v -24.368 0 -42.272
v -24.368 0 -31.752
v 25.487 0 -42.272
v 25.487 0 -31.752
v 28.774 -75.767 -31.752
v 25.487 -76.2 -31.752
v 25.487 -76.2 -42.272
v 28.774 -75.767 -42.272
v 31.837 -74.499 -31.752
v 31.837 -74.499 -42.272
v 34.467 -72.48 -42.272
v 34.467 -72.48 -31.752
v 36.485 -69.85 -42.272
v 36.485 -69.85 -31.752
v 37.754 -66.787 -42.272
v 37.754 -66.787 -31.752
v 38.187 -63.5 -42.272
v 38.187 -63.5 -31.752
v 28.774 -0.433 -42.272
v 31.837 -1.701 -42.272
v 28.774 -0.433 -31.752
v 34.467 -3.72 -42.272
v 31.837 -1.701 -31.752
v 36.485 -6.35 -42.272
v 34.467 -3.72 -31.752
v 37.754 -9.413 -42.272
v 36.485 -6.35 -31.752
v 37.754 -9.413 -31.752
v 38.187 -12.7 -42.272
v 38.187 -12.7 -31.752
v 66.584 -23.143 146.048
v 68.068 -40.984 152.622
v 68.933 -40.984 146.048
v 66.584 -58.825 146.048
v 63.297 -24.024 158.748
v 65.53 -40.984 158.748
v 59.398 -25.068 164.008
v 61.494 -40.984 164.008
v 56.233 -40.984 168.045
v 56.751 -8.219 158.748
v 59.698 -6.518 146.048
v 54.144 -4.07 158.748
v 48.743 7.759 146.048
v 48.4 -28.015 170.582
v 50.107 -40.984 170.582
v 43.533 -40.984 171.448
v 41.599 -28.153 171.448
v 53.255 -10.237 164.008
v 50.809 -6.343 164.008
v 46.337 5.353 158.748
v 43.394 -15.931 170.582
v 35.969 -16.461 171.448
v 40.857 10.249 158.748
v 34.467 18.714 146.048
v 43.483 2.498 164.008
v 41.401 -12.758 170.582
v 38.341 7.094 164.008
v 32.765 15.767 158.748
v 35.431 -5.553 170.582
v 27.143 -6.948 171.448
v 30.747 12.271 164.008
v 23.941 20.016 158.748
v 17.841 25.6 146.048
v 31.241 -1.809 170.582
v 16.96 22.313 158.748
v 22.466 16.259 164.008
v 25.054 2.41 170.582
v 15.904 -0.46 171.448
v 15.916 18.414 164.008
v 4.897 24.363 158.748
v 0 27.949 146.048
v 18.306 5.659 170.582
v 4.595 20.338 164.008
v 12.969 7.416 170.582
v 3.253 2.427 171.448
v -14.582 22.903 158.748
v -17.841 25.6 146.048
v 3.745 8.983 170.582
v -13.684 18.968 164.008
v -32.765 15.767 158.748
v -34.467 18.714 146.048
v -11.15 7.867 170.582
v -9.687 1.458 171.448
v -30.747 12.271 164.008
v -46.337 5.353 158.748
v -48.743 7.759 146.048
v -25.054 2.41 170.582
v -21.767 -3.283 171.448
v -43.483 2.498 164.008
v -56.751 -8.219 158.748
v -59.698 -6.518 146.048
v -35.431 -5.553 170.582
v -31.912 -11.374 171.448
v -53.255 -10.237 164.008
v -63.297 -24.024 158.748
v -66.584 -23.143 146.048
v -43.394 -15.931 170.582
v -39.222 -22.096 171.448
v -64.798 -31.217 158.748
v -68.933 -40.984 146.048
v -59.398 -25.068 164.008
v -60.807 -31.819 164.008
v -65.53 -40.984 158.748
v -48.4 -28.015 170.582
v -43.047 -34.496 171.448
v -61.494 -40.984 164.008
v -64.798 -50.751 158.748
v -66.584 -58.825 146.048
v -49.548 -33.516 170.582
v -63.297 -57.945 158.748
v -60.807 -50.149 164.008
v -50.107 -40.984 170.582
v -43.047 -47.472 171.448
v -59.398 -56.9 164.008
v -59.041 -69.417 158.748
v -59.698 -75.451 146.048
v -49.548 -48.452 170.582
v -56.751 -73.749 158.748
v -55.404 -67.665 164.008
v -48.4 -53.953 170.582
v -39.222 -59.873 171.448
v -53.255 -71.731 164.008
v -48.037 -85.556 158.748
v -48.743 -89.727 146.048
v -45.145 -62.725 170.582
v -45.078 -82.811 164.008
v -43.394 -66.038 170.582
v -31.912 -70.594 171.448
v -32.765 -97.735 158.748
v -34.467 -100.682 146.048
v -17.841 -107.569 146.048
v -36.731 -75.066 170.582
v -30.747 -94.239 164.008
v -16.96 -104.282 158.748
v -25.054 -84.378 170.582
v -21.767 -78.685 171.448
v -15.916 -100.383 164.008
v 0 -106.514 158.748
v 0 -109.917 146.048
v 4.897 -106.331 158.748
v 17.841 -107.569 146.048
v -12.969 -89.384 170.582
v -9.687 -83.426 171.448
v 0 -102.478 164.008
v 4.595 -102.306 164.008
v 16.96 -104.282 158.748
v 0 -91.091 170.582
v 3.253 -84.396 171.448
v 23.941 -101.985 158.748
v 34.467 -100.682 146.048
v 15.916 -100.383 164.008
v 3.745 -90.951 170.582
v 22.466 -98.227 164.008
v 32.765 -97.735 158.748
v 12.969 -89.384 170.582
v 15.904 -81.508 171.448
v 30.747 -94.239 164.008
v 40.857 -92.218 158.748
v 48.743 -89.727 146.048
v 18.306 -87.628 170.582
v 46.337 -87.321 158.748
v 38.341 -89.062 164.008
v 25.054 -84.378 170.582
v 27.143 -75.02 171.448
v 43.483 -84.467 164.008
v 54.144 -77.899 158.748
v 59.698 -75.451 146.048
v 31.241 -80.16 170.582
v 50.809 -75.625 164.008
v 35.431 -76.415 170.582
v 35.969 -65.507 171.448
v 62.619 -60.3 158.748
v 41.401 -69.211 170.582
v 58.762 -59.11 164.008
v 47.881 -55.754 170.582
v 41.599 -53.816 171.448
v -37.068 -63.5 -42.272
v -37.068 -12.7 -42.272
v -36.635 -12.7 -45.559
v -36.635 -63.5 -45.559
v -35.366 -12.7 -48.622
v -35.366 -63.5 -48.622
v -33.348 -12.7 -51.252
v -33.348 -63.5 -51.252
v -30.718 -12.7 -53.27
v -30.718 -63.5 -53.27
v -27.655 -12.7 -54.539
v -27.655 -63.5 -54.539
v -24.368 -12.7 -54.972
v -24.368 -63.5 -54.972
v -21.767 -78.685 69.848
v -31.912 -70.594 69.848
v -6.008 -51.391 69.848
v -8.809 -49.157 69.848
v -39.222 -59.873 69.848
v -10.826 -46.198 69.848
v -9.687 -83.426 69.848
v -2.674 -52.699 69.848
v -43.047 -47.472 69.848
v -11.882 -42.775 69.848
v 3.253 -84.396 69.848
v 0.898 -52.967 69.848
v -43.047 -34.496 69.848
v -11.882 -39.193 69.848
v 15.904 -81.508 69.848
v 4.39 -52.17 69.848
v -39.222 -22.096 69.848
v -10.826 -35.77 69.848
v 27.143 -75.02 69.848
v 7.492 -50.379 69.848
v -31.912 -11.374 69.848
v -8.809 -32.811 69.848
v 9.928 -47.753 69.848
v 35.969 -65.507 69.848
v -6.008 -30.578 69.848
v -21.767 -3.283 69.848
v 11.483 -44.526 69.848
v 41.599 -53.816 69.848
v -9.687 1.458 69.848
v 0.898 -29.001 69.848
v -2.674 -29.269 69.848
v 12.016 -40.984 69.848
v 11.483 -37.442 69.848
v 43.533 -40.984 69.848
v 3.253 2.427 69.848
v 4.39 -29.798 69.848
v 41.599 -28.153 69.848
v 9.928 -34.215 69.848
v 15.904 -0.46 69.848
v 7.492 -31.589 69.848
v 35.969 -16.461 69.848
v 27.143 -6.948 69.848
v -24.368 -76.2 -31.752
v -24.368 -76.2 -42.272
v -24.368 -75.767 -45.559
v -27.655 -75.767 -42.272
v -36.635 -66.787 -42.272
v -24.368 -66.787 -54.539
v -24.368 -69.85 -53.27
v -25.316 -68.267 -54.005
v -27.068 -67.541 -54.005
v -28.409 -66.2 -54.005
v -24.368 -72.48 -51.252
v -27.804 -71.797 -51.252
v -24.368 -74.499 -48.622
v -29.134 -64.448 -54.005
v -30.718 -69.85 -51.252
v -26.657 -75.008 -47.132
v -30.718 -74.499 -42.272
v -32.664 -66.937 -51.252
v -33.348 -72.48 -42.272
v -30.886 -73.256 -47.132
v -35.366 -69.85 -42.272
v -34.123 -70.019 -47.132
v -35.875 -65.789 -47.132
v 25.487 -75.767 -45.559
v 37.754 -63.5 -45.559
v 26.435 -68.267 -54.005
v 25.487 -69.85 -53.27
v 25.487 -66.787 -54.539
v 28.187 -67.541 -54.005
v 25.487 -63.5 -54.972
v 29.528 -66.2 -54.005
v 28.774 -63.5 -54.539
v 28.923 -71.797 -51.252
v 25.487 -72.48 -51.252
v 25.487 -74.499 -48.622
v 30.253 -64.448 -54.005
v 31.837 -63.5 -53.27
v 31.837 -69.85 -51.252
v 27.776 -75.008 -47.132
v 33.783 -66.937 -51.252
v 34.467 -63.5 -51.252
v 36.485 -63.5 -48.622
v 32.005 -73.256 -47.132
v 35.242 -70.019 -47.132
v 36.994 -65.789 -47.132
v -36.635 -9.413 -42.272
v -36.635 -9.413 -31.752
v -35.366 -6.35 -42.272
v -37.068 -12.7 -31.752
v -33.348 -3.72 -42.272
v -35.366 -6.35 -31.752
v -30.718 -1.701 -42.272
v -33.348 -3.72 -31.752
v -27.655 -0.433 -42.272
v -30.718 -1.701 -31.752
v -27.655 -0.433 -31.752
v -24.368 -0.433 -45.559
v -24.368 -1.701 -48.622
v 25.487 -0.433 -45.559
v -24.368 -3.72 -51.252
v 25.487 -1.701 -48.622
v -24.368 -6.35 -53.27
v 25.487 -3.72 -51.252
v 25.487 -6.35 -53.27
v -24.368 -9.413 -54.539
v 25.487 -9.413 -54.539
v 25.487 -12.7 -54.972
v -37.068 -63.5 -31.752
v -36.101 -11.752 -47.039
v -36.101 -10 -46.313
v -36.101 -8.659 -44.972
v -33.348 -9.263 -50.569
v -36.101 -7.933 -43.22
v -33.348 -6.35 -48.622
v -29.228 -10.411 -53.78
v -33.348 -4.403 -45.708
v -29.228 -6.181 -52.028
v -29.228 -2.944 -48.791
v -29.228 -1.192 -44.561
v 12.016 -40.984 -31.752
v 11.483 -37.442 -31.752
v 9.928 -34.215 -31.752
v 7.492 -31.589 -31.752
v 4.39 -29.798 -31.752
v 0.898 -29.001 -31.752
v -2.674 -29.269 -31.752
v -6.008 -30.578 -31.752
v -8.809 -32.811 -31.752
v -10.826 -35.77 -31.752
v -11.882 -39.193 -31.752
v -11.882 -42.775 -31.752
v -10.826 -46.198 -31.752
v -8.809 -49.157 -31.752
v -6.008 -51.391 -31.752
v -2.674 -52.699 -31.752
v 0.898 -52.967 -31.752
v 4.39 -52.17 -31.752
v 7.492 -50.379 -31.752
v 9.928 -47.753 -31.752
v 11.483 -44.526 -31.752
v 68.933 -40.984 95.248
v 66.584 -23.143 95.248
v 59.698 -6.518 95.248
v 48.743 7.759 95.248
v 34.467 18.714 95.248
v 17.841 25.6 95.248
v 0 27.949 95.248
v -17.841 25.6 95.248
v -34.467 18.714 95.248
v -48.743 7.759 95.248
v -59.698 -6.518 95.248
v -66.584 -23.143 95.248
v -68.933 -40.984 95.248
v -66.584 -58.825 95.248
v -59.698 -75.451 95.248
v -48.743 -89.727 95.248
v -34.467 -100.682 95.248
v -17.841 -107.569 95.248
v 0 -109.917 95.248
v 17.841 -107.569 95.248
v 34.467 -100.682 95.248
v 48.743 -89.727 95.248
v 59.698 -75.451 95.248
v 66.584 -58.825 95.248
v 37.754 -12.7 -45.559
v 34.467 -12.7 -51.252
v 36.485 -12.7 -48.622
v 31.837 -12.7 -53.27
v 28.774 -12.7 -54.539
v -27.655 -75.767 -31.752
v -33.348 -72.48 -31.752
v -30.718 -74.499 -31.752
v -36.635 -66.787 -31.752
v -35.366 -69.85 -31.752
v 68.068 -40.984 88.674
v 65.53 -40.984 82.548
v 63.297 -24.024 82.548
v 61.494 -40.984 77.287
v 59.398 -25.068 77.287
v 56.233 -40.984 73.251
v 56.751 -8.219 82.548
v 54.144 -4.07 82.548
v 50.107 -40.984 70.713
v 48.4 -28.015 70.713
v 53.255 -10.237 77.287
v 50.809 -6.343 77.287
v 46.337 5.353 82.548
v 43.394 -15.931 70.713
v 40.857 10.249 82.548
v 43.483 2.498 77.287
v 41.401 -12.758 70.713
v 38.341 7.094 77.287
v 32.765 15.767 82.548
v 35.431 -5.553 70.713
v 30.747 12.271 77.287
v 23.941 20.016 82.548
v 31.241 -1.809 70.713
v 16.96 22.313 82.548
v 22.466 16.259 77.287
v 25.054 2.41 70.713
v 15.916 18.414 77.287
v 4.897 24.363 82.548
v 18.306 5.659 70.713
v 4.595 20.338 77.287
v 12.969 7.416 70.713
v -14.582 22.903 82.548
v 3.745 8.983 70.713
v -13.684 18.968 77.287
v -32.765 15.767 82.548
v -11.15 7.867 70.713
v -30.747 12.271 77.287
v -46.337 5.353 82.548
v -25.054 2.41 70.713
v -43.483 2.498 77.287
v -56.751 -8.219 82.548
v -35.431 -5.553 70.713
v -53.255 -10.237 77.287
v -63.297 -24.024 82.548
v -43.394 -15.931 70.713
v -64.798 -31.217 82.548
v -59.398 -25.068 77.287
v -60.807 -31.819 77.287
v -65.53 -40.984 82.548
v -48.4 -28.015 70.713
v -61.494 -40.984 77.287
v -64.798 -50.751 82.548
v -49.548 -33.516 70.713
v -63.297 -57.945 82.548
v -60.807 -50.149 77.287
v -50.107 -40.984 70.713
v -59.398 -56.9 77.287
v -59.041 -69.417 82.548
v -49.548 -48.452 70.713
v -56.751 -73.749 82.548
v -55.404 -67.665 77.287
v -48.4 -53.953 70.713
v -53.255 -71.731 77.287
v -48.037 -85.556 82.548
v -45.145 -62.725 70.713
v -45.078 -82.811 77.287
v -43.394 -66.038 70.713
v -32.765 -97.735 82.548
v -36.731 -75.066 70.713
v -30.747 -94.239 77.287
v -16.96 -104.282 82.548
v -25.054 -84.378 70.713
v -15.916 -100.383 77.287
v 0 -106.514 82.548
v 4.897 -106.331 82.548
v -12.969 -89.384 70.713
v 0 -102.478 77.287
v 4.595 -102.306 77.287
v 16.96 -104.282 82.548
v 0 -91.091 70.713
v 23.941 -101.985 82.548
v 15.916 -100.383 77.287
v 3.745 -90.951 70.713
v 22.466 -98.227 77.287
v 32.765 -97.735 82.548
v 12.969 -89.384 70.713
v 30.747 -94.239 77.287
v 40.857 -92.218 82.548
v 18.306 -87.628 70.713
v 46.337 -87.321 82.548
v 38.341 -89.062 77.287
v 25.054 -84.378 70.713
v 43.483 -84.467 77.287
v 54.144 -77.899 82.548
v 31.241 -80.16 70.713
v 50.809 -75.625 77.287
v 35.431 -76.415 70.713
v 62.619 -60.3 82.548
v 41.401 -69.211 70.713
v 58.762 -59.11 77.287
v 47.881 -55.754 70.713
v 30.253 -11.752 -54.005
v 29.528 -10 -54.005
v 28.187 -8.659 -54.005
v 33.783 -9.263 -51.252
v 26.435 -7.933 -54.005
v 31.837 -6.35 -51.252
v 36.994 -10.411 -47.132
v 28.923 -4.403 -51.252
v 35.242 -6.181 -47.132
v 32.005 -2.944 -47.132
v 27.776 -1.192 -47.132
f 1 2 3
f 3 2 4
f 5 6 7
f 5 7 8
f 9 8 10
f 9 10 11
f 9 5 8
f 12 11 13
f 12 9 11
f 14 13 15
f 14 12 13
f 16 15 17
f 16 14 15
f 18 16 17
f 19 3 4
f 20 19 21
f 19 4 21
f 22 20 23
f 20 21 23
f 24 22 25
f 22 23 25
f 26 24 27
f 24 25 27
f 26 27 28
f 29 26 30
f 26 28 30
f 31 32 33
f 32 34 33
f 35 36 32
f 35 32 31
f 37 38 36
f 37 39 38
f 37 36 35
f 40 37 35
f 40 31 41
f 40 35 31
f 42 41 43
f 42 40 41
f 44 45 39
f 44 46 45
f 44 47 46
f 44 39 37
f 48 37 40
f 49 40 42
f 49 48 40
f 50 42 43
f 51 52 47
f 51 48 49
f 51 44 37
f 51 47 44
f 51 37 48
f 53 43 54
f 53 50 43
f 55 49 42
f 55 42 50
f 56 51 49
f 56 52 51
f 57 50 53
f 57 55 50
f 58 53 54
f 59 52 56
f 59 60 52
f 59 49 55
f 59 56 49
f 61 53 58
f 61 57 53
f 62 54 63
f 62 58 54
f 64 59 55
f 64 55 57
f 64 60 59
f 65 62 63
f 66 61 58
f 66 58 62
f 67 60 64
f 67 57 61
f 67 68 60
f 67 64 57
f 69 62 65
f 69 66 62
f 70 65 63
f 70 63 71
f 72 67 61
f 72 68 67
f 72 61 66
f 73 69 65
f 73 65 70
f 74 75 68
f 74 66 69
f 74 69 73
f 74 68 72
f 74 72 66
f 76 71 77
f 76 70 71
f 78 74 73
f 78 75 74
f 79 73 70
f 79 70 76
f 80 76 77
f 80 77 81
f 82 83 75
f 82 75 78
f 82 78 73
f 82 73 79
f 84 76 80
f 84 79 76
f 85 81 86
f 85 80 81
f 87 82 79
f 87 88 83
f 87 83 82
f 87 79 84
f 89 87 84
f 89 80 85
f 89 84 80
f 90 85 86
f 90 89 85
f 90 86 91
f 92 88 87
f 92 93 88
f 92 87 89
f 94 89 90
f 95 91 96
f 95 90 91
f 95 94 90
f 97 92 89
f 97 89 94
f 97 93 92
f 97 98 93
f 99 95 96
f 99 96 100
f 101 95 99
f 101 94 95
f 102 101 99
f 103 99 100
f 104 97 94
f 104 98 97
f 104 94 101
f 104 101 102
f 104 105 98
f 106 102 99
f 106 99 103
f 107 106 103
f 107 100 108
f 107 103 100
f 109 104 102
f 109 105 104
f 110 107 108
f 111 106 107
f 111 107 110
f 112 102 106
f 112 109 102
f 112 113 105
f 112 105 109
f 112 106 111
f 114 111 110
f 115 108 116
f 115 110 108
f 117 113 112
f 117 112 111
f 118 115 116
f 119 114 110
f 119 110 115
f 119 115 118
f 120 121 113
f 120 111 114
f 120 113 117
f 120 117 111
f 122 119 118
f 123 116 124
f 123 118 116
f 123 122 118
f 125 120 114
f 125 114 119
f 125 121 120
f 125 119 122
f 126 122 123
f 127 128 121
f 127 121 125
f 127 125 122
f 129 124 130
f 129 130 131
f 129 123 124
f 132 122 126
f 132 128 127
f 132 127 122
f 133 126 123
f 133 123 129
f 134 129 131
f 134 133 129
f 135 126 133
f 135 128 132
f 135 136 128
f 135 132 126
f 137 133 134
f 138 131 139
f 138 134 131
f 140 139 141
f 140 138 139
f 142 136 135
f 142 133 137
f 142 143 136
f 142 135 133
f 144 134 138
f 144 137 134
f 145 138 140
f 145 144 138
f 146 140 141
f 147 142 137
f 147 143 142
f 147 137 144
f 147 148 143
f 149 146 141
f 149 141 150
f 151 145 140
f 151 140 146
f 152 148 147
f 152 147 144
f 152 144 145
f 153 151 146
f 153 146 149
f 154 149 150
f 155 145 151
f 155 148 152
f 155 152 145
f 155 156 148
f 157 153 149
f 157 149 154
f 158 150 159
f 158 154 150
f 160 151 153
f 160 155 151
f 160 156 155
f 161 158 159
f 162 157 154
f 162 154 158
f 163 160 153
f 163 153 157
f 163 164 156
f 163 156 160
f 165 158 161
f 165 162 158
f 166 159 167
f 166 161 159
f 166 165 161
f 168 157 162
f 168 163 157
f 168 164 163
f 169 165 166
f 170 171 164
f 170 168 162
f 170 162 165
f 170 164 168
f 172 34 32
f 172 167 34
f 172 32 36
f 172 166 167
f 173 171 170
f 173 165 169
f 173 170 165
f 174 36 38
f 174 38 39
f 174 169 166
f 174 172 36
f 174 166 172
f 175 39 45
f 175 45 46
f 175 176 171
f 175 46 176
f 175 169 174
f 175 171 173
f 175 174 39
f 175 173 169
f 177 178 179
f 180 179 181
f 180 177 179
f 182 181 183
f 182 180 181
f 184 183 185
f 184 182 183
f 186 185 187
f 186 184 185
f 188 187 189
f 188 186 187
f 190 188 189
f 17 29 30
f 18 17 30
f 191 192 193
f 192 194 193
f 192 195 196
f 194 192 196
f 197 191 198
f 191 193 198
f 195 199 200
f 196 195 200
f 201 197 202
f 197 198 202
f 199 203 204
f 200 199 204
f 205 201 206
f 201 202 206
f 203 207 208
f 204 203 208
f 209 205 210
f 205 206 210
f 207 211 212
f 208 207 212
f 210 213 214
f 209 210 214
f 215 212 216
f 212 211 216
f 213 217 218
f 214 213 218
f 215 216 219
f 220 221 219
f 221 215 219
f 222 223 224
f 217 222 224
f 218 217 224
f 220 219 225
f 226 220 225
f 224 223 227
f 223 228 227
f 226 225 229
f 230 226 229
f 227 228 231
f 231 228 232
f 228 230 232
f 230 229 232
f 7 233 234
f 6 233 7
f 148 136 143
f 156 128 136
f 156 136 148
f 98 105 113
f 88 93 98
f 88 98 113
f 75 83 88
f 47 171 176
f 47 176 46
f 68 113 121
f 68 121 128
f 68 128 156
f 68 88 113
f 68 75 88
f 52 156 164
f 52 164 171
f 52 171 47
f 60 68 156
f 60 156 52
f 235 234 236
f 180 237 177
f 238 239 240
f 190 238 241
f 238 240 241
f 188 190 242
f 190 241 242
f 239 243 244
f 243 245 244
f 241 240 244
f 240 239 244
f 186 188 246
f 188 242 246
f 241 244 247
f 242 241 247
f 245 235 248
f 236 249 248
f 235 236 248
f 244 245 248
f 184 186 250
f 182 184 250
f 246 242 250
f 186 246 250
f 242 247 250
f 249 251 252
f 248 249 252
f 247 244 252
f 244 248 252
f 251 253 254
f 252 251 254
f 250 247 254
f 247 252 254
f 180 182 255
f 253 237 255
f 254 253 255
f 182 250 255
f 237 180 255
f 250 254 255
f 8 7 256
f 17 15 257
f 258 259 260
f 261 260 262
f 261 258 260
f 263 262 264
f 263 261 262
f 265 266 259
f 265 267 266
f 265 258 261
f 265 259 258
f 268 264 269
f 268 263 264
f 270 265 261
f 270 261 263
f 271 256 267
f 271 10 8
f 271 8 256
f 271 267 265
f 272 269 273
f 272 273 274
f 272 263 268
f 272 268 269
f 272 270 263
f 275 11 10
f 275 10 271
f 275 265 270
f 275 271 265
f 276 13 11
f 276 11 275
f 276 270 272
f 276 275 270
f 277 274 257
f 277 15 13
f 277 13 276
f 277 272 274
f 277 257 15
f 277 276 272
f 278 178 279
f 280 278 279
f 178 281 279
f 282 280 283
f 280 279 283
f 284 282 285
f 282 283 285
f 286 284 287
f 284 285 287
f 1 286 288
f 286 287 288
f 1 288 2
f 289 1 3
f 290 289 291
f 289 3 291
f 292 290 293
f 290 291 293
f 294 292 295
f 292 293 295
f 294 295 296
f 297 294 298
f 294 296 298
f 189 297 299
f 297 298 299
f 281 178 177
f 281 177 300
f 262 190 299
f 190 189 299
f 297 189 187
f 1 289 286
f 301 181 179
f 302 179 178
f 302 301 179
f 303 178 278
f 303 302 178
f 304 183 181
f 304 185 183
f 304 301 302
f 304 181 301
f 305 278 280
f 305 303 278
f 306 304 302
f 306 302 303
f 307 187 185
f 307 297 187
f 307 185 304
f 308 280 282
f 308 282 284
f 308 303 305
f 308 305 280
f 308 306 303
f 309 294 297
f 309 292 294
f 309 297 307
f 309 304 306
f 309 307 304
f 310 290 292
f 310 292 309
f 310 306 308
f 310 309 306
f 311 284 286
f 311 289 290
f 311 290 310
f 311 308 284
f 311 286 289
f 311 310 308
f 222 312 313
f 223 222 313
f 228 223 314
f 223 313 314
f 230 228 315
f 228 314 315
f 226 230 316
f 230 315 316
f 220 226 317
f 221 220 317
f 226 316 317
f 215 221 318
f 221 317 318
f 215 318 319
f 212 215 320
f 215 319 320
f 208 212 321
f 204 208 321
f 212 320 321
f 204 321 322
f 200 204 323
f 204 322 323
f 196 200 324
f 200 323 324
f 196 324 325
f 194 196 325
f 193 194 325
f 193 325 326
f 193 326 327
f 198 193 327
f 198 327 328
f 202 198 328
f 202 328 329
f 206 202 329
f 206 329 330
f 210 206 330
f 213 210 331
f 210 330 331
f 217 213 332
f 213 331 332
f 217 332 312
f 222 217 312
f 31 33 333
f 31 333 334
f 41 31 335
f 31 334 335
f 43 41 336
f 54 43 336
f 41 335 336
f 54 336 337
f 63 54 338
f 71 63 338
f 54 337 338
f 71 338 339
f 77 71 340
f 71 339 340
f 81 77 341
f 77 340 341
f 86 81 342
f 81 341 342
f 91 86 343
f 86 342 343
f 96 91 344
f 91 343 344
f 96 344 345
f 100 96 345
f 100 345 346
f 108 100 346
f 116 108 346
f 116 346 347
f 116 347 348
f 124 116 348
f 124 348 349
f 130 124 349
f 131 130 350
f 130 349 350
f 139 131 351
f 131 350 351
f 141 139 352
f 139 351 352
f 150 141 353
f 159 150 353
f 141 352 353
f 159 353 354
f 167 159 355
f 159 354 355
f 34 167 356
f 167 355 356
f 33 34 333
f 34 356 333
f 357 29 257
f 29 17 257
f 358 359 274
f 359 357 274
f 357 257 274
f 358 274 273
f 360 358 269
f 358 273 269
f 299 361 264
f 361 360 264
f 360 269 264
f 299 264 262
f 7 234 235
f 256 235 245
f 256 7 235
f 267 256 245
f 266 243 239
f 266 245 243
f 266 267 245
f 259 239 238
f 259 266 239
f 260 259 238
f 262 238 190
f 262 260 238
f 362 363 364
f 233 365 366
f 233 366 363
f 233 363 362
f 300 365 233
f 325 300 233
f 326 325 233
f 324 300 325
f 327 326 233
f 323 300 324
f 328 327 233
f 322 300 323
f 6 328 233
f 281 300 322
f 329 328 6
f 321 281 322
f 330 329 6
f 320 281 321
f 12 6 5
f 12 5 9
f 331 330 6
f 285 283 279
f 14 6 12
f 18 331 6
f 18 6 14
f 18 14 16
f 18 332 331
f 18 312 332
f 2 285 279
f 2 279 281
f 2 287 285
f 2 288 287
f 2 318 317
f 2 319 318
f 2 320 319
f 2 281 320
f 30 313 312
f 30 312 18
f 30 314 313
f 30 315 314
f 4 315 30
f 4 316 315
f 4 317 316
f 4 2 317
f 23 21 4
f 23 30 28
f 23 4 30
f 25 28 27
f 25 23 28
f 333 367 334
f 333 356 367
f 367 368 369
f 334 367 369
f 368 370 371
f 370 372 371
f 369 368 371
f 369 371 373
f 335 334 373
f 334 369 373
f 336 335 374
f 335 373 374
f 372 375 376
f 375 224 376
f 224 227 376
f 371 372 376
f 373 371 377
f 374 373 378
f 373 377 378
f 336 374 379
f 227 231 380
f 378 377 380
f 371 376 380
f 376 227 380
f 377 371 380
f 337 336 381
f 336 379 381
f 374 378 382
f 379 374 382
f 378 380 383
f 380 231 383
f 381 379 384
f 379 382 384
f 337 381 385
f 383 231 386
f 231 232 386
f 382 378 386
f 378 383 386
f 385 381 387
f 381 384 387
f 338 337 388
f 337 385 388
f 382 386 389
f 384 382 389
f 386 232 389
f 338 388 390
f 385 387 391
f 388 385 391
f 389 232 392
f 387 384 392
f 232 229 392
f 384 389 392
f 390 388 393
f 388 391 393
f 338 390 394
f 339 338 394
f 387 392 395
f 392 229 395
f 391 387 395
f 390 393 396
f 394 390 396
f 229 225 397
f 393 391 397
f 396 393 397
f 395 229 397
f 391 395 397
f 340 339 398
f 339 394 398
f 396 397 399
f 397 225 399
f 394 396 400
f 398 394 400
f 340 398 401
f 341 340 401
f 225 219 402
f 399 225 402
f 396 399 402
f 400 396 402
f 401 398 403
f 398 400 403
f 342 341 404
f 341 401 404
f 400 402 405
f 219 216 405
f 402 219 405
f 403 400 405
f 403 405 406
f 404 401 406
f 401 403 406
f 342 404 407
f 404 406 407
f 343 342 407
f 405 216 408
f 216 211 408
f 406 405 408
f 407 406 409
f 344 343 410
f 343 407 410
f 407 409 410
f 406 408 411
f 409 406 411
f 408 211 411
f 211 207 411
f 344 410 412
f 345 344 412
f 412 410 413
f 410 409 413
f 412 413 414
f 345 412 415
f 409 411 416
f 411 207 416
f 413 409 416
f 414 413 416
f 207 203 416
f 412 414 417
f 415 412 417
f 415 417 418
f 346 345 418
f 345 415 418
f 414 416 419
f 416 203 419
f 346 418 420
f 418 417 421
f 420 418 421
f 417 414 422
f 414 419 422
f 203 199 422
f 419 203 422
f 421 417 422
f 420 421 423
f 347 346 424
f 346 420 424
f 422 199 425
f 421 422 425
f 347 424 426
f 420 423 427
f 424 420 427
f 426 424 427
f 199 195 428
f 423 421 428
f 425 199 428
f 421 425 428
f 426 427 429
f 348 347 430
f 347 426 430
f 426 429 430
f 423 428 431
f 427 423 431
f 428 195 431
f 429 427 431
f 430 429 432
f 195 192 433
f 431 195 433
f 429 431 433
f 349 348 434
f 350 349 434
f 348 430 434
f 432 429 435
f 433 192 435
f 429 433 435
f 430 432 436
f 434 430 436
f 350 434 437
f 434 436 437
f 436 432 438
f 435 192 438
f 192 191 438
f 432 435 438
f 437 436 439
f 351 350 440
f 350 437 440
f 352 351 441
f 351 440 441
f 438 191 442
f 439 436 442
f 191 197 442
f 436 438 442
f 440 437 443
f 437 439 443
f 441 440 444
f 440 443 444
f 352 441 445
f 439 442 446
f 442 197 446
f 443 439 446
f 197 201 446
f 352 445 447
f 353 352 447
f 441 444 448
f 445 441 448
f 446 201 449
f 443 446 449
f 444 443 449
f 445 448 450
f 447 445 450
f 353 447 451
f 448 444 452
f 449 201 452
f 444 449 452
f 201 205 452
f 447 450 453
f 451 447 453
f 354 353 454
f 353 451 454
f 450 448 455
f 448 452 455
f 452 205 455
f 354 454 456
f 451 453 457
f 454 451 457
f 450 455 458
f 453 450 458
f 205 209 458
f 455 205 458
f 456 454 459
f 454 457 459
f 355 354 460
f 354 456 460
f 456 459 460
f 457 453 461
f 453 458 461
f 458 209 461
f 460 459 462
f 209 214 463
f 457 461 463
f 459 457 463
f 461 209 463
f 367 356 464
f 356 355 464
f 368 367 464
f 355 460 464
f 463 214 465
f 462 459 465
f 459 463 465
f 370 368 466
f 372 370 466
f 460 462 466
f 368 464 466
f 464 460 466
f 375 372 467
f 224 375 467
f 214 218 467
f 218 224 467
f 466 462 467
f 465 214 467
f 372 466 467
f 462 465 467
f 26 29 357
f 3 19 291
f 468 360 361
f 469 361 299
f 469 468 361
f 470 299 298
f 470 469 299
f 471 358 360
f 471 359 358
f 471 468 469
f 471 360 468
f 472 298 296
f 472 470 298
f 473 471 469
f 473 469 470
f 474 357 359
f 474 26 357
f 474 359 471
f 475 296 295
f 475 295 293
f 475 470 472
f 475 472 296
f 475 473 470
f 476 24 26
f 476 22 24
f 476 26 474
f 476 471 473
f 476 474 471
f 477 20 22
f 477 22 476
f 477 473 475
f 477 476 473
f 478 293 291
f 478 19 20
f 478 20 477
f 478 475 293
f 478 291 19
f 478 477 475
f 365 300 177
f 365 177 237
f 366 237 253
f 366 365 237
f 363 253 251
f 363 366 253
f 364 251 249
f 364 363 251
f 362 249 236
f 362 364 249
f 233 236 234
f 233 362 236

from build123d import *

# Parameters (mm, degrees)
F0_W     = 75.254161
F0_H     = 23.219683
F1_DEPTH = 76.2
F2_R     = 12.016458
F3_DEPTH = 101.6
F4_R     = 68.933228
F5_DEPTH = 101.6
F6_R     = 25.4
F7_R     = 12.7


with BuildPart() as f1:
    # F0 (on Front) → F1 (new body)
    with BuildSketch(Plane.XZ):
        with Locations((0.559511, -43.362062)):
            Rectangle(F0_W, F0_H)
    extrude(amount=F1_DEPTH)

    # F2 (on face) → F3 (join)
    with BuildSketch(Plane.XY.offset(-31.752221)):
        with Locations((0, -40.984146)):
            Circle(F2_R)
    extrude(amount=F3_DEPTH)

    # F4 (on face) → F5 (join)
    with BuildSketch(Plane.XY.offset(69.847779)):
        with Locations((0, -40.984146)):
            Circle(F4_R)
    extrude(amount=F5_DEPTH)

    # F6
    f6_edges = [f1.edges().sort_by_distance(p)[0] for p in [
        (-68.933228, -40.984146, 171.447779),
        (-68.933228, -40.984146, 69.847779),
    ]]
    fillet(f6_edges, radius=F6_R)

    # F7
    f7_edges = [f1.edges().sort_by_distance(p)[0] for p in [
        (38.186591, -76.2, -43.362062),
        (38.186591, 0, -43.362062),
        (-37.06757, -76.2, -43.362062),
        (0.559511, -76.2, -54.971904),
        (38.186591, -38.1, -54.971904),
        (0.559511, 0, -54.971904),
        (-37.06757, -38.1, -54.971904),
        (-37.06757, 0, -43.362062),
    ]]
    fillet(f7_edges, radius=F7_R)


solid = f1.part
